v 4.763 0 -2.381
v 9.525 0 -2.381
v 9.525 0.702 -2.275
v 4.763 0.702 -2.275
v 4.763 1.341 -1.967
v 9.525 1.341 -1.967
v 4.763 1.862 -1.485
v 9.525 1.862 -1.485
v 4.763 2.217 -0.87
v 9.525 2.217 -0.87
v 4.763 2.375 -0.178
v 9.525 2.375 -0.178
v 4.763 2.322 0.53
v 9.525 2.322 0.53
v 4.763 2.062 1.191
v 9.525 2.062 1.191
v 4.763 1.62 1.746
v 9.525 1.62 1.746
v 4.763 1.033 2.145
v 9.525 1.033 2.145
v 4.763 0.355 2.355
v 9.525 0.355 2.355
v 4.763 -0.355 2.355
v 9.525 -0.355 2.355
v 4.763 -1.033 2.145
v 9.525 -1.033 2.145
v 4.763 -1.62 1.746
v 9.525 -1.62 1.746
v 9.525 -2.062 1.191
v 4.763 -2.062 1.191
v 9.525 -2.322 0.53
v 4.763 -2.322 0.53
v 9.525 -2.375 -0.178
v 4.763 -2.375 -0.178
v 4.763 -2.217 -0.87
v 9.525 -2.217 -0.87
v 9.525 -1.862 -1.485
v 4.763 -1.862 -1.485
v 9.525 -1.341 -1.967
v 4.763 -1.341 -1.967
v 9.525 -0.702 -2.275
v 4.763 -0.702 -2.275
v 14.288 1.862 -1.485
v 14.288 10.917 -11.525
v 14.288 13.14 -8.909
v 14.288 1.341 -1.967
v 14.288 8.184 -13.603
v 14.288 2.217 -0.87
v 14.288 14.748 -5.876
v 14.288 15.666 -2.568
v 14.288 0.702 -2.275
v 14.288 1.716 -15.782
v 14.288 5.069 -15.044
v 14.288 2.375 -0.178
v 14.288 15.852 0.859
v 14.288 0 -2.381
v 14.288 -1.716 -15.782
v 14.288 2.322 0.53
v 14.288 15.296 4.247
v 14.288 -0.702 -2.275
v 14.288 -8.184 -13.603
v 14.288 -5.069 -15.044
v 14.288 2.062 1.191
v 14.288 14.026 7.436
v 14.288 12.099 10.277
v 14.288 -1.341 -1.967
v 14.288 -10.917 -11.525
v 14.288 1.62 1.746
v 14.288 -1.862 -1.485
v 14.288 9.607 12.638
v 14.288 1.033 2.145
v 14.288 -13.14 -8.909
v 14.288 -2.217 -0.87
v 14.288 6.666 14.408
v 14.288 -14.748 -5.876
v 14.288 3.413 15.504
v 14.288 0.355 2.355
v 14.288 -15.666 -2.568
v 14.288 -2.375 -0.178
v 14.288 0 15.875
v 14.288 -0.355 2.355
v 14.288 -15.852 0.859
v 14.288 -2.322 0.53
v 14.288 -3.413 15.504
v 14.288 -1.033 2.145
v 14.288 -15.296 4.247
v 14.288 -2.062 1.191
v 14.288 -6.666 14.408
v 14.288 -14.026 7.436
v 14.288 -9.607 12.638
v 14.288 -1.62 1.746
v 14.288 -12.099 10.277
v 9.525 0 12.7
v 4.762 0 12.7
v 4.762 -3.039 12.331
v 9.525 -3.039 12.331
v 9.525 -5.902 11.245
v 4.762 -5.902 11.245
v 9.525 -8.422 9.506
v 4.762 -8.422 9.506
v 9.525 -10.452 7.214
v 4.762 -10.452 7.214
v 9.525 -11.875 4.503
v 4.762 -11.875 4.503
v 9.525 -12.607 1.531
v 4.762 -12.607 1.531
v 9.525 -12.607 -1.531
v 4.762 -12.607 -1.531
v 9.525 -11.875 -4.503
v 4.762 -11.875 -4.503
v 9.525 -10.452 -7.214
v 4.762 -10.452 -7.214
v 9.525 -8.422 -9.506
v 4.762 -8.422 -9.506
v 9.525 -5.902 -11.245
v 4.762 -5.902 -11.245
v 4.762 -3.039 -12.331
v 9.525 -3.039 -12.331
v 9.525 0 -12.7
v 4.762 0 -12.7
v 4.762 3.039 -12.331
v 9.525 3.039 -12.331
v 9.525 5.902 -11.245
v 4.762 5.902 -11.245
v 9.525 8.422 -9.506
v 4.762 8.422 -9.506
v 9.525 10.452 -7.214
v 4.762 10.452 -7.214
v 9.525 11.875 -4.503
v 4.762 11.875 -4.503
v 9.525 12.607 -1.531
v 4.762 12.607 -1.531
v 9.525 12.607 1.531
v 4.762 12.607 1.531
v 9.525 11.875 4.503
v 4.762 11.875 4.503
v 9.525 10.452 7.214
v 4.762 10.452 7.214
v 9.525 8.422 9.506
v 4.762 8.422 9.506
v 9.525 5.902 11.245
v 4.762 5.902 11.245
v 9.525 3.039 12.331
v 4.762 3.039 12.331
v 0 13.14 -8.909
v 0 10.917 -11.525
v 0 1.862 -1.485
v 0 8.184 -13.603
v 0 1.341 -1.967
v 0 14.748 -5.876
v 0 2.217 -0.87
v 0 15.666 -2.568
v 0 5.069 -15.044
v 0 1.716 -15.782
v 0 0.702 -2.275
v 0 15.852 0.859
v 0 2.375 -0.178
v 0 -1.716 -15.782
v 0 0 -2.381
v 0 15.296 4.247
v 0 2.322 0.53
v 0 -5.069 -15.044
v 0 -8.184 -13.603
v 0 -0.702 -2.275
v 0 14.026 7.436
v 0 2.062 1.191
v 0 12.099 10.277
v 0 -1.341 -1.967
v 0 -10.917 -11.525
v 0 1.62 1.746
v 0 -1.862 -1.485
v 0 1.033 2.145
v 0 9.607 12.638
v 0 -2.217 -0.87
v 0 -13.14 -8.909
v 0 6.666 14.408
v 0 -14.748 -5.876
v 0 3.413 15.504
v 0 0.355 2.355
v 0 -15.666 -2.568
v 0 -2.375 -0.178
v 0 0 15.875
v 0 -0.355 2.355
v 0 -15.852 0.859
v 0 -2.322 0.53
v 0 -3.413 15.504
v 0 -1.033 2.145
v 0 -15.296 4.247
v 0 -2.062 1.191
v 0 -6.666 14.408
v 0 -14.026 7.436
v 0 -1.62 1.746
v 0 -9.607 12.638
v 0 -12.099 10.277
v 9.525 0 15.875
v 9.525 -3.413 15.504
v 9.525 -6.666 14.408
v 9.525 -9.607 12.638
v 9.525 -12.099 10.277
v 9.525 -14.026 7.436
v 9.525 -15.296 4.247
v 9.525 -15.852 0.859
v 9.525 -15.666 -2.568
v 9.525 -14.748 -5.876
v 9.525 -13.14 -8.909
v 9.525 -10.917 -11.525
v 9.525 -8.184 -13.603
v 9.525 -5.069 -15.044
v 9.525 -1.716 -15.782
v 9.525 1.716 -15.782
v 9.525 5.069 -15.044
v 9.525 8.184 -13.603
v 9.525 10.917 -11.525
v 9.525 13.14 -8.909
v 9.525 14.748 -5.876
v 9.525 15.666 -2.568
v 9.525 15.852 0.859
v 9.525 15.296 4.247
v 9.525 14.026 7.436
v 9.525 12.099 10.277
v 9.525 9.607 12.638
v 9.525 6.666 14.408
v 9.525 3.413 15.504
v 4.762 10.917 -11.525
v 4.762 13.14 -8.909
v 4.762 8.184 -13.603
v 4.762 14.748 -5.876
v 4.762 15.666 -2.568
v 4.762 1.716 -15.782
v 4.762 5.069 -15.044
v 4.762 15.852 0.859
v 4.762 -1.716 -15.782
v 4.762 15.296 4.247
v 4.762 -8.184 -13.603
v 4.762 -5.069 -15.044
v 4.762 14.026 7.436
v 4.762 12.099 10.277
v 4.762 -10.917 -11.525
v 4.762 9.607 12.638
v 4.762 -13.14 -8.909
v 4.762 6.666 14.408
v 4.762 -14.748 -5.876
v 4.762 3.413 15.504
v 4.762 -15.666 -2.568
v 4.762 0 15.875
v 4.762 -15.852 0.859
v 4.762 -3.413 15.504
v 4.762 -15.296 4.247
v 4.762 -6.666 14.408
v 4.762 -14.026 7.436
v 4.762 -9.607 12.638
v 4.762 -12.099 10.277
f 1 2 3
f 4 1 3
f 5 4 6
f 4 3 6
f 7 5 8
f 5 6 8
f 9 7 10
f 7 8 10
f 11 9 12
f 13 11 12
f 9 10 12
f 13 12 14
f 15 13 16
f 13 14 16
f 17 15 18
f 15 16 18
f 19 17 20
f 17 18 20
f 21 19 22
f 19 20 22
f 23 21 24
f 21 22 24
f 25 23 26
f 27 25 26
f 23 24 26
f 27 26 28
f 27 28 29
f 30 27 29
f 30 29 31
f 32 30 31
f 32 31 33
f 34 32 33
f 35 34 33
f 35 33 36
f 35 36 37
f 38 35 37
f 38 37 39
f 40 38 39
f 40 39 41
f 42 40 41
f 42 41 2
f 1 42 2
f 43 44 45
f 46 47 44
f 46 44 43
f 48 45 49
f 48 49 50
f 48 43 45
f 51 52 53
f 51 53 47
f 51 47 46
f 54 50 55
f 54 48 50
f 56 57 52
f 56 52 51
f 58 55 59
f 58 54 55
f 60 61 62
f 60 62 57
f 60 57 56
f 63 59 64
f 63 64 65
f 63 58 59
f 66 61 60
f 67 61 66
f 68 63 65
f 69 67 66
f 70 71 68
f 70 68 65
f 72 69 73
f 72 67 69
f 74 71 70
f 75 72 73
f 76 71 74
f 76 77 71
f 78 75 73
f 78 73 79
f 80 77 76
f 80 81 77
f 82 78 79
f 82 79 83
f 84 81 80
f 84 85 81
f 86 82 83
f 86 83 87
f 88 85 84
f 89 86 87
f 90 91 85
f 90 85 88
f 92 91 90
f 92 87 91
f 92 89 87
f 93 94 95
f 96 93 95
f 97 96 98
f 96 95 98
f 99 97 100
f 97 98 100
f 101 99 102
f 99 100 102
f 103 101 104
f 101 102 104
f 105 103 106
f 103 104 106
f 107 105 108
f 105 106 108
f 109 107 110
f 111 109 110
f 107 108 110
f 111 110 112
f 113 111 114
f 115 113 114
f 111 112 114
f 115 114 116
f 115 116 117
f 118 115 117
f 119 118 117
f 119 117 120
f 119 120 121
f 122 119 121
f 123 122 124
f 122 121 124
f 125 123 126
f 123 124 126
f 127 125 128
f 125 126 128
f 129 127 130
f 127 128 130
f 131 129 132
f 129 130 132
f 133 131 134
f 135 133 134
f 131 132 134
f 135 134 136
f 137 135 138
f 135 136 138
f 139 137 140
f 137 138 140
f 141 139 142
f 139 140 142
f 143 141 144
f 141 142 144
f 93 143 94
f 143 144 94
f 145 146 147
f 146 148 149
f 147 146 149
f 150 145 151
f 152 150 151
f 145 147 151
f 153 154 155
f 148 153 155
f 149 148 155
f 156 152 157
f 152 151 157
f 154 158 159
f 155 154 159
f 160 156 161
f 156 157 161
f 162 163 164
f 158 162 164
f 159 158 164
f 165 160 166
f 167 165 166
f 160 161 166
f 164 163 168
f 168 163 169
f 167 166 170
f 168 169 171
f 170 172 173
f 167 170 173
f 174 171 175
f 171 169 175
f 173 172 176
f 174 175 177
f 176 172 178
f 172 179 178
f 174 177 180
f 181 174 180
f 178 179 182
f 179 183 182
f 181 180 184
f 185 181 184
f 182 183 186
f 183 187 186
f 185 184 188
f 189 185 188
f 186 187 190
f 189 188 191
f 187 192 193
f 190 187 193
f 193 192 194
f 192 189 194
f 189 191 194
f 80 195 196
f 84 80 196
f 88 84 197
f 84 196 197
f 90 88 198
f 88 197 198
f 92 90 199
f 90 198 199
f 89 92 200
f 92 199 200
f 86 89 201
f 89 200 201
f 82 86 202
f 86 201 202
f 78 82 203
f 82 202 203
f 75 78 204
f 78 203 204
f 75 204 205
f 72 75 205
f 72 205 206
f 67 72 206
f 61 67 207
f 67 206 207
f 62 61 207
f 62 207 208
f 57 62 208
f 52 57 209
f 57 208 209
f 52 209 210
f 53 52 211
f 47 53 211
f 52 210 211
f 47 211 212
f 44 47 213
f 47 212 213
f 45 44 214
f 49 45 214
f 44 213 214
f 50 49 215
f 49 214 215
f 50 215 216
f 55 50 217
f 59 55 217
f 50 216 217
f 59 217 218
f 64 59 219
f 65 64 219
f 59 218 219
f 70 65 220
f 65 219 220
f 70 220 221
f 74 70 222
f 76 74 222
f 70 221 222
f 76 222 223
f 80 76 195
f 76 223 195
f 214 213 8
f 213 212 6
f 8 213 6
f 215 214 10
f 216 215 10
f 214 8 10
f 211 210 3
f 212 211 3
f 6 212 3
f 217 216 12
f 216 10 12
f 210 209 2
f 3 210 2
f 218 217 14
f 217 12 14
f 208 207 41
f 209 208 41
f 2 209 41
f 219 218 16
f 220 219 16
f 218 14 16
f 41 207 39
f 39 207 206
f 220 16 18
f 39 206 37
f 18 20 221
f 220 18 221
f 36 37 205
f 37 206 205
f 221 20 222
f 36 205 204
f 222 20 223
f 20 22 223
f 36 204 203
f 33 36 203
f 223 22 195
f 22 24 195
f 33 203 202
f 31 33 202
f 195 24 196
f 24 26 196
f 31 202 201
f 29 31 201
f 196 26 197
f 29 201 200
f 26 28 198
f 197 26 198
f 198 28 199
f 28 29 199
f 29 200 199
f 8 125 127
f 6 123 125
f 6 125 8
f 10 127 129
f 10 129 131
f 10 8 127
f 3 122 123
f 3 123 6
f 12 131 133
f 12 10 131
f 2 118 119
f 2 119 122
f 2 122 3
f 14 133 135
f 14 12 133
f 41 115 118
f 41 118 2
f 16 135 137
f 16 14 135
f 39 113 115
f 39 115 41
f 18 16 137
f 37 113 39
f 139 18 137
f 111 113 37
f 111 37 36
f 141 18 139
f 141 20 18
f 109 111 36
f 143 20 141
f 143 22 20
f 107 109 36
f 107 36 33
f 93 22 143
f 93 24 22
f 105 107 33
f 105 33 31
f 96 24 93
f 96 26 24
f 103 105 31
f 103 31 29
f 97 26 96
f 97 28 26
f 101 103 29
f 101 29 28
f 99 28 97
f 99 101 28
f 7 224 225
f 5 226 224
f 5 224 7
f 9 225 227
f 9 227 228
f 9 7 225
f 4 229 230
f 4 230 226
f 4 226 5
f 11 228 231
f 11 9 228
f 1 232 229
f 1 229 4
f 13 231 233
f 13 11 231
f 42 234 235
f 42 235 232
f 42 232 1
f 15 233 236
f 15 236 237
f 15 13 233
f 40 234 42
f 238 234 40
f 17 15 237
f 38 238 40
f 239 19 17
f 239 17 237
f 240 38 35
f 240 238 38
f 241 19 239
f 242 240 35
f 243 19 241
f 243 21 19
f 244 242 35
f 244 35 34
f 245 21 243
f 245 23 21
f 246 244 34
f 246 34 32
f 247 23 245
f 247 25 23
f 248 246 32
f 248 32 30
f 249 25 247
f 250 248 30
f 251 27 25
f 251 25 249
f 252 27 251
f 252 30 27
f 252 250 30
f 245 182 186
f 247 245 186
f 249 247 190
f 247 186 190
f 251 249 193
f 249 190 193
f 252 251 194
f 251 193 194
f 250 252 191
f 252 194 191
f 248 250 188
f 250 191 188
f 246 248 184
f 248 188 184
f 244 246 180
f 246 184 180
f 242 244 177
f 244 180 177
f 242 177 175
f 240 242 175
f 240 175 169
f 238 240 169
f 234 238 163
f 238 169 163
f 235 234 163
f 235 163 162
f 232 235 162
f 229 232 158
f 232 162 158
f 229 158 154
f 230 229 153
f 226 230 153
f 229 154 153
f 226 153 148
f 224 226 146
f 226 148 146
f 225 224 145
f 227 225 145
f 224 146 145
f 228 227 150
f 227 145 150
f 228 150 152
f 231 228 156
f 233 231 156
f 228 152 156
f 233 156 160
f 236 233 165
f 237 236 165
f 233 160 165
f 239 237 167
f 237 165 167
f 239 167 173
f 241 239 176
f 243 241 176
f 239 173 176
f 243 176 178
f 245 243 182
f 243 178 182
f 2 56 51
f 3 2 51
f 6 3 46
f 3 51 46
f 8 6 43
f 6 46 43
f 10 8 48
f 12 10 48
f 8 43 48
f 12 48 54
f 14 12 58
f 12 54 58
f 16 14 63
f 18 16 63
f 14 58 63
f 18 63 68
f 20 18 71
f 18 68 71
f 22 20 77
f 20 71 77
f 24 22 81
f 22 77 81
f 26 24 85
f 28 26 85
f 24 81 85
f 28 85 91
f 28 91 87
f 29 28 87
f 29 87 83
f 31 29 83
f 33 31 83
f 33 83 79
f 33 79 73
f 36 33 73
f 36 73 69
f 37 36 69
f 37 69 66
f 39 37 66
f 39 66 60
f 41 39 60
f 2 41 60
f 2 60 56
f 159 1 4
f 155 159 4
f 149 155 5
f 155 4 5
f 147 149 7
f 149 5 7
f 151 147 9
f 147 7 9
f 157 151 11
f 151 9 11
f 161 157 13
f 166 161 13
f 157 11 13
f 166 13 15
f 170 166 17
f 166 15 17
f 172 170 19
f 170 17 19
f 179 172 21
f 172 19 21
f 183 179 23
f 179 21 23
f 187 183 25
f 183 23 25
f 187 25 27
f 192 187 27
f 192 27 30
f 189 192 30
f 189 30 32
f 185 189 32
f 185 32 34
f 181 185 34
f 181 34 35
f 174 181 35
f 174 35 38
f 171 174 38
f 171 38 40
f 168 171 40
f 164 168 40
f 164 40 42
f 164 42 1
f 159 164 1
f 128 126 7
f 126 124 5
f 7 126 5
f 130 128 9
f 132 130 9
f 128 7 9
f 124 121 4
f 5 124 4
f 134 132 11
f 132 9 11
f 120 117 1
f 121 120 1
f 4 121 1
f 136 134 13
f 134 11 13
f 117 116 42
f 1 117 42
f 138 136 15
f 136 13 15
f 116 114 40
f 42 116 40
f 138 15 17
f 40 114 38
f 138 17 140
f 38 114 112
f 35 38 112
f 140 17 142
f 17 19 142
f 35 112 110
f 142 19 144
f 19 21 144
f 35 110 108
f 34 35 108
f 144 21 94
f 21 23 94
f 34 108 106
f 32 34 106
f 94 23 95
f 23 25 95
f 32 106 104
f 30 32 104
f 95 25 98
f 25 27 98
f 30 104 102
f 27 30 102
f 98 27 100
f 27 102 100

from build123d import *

# Parameters (mm, degrees)
SKETCH3_R           = 15.875
BOSS_EXTRUDE1_DEPTH = 4.7625
SKETCH5_R           = 12.7
BOSS_EXTRUDE2_DEPTH = 4.7625
SKETCH6_R           = 15.875
BOSS_EXTRUDE3_DEPTH = 4.7625
SKETCH7_R           = 2.38125
CUT_EXTRUDE1_DEPTH  = 27.6113492


with BuildPart() as part:
    # Sketch3 → Boss-Extrude1 (new body)
    with BuildSketch(Plane(origin=(0, 0, 0), x_dir=(0, 0, -1), z_dir=(1, 0, 0))):
        with Locations(Location((0, 0, 0), (0, 0, 180))):
            Circle(SKETCH3_R)
    extrude(amount=BOSS_EXTRUDE1_DEPTH)


with BuildPart() as body_2:
    # Sketch5 → Boss-Extrude2 (new body)
    with BuildSketch(Plane(origin=(4.7625, 0, 0), x_dir=(0, 0, -1), z_dir=(1, 0, 0))):
        with Locations(Location((0, 0, 0), (0, 0, 180))):
            Circle(SKETCH5_R)
    extrude(amount=BOSS_EXTRUDE2_DEPTH)


with BuildPart() as body_3:
    # Sketch6 → Boss-Extrude3 (new body)
    with BuildSketch(Plane(origin=(9.525, 0, 0), x_dir=(0, 0, -1), z_dir=(1, 0, 0))):
        with Locations(Location((0, 0, 0), (0, 0, 180))):
            Circle(SKETCH6_R)
    extrude(amount=BOSS_EXTRUDE3_DEPTH)


with BuildPart() as cut_extrude1_tool:
    # Sketch7 → Cut-Extrude1 (new, through all)
    with BuildSketch(Plane(origin=(14.2875, 0, 0), x_dir=(0, 0, -1), z_dir=(1, 0, 0))):
        Circle(SKETCH7_R)
    extrude(amount=-CUT_EXTRUDE1_DEPTH)


with BuildPart() as part_1:
    add(part.part)

    # Cut-Extrude1: cut by cut_extrude1_tool
    add(cut_extrude1_tool.part, mode=Mode.SUBTRACT)


with BuildPart() as body_2_1:
    add(body_2.part)

    # Cut-Extrude1: cut by cut_extrude1_tool
    add(cut_extrude1_tool.part, mode=Mode.SUBTRACT)


with BuildPart() as body_3_1:
    add(body_3.part)

    # Cut-Extrude1: cut by cut_extrude1_tool
    add(cut_extrude1_tool.part, mode=Mode.SUBTRACT)


solid = Compound([part_1.part, body_2_1.part, body_3_1.part])
